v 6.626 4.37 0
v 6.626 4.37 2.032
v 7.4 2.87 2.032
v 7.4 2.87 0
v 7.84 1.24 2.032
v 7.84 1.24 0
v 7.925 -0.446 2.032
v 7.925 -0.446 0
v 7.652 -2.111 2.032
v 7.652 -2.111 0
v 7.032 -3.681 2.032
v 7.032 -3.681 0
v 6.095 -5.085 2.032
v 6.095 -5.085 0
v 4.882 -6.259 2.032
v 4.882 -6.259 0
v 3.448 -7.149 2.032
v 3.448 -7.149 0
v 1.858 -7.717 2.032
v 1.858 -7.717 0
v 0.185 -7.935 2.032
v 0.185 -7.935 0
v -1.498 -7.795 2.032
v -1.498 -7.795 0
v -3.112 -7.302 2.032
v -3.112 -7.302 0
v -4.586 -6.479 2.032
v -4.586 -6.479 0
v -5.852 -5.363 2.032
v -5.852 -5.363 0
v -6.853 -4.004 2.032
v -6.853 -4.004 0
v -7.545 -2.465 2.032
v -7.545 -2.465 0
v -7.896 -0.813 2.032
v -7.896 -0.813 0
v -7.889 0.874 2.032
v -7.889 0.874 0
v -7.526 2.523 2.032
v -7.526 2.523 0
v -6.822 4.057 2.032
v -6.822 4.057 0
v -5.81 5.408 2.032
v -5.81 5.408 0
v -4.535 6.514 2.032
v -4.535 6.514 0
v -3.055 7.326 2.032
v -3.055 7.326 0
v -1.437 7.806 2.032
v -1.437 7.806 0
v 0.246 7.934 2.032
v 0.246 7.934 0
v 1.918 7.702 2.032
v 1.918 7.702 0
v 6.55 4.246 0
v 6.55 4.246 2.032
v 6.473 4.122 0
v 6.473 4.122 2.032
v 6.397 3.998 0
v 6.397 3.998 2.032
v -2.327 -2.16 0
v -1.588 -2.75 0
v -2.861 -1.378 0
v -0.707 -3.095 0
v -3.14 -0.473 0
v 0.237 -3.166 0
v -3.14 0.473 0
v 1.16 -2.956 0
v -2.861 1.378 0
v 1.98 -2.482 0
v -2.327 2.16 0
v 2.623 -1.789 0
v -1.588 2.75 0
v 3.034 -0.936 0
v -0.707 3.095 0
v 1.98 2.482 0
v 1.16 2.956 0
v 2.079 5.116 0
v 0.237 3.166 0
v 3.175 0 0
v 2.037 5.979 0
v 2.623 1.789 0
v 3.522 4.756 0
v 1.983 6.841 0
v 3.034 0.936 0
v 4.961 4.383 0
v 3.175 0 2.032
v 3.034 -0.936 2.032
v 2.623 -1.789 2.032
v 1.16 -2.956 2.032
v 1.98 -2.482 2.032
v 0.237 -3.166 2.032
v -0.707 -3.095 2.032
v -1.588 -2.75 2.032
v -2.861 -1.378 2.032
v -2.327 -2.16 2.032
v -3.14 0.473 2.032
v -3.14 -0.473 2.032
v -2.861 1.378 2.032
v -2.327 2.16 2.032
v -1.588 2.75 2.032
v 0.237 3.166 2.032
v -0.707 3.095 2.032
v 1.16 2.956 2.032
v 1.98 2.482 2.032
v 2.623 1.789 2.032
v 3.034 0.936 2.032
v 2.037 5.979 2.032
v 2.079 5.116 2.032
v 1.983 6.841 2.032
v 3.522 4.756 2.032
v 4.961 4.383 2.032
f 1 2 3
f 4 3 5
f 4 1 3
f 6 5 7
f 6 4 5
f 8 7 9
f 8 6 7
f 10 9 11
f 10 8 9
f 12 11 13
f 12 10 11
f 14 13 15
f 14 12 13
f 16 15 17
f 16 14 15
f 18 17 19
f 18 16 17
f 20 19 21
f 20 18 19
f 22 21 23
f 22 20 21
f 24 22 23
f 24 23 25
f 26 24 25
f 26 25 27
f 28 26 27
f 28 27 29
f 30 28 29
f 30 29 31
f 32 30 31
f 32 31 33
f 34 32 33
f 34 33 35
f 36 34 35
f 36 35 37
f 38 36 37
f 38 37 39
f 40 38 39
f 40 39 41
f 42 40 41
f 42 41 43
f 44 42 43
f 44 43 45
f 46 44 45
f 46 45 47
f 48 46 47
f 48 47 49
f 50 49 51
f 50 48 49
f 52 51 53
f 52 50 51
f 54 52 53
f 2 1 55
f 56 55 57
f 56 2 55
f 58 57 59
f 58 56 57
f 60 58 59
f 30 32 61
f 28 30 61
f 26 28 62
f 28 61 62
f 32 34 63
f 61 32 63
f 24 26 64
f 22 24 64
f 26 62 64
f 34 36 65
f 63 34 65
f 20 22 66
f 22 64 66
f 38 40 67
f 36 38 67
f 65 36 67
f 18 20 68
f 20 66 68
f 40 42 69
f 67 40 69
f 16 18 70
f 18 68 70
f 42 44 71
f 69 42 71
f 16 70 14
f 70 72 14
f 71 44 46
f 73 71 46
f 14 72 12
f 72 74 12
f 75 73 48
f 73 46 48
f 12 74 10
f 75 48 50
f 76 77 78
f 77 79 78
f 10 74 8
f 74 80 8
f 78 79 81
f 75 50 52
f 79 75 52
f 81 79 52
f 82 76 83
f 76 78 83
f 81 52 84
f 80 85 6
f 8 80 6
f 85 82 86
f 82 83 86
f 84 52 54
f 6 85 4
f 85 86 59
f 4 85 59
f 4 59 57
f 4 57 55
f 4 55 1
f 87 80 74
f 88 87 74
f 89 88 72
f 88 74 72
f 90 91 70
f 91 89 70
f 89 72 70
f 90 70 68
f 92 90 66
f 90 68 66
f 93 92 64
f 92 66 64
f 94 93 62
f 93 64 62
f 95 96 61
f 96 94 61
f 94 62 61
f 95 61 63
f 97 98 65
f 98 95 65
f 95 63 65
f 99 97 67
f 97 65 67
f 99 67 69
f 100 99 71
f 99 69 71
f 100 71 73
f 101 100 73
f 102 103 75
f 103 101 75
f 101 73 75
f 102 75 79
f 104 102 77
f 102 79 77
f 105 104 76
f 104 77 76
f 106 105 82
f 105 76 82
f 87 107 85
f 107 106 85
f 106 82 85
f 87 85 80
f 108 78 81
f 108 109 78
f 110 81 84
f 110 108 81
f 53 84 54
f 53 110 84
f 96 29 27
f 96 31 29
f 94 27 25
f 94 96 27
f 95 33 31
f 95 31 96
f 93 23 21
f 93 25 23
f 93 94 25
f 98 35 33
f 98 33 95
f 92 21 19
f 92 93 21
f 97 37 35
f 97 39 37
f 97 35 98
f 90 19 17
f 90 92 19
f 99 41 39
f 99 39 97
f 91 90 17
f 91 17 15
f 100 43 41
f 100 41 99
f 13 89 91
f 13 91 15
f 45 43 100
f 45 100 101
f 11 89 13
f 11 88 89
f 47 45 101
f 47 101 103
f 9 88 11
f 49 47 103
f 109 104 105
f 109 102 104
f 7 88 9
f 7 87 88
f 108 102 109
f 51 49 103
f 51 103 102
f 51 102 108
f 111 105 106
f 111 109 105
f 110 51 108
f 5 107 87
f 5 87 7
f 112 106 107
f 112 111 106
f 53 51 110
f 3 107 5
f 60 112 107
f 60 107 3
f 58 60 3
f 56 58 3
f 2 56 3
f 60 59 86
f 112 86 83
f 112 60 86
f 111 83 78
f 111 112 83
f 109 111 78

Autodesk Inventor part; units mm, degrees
ref_plane "YZ Plane" through (0, 0, 0) normal (1, 0, 0) x (0, 1, 0)
ref_plane "XZ Plane" through (0, 0, 0) normal (0, 1, 0) x (-1, 0, 0)
ref_plane "XY Plane" through (0, 0, 0) normal (0, 0, 1) x (1, 0, 0)
sketch "Sketch1" plane through (0, 0, 0) normal (0, 0, 1) x (1, 0, 0)
  circle A0 centre (0, 0) radius 7.9375
  circle A1 centre (0, 0) radius 3.175
  dimension "d0" = 15.875
  dimension "d1" = 6.35
extrude "Extrusion1" add sketch "Sketch1" along normal blind 2.032
sketch "Sketch2" plane through (0, 0, 2.032) normal (0, 0, 1) x (1, 0, 0)
  circle A0 centre (0, 0) radius 7.9375 construction
  arc A1 (2.0793, 5.1162) -> (0.2784, 17.7544) centre (-62.2212, 2.4011) ccw projected
  arc A2 (14.1052, 14.1744) -> (6.3972, 3.9982) centre (61.3005, -29.5808) ccw projected
  arc A3 (6.3972, 3.9982) -> (2.0793, 5.1162) centre (-39.8868, -165.864) ccw projected
  arc A4 (6.6263, 4.3699) -> (1.9179, 7.7023) centre (0, 0) ccw
extrude "Extrusion2" cut sketch "Sketch2" against normal blind 25.4
properties part number "Gear Washer Spacer 3" material "Steel"
